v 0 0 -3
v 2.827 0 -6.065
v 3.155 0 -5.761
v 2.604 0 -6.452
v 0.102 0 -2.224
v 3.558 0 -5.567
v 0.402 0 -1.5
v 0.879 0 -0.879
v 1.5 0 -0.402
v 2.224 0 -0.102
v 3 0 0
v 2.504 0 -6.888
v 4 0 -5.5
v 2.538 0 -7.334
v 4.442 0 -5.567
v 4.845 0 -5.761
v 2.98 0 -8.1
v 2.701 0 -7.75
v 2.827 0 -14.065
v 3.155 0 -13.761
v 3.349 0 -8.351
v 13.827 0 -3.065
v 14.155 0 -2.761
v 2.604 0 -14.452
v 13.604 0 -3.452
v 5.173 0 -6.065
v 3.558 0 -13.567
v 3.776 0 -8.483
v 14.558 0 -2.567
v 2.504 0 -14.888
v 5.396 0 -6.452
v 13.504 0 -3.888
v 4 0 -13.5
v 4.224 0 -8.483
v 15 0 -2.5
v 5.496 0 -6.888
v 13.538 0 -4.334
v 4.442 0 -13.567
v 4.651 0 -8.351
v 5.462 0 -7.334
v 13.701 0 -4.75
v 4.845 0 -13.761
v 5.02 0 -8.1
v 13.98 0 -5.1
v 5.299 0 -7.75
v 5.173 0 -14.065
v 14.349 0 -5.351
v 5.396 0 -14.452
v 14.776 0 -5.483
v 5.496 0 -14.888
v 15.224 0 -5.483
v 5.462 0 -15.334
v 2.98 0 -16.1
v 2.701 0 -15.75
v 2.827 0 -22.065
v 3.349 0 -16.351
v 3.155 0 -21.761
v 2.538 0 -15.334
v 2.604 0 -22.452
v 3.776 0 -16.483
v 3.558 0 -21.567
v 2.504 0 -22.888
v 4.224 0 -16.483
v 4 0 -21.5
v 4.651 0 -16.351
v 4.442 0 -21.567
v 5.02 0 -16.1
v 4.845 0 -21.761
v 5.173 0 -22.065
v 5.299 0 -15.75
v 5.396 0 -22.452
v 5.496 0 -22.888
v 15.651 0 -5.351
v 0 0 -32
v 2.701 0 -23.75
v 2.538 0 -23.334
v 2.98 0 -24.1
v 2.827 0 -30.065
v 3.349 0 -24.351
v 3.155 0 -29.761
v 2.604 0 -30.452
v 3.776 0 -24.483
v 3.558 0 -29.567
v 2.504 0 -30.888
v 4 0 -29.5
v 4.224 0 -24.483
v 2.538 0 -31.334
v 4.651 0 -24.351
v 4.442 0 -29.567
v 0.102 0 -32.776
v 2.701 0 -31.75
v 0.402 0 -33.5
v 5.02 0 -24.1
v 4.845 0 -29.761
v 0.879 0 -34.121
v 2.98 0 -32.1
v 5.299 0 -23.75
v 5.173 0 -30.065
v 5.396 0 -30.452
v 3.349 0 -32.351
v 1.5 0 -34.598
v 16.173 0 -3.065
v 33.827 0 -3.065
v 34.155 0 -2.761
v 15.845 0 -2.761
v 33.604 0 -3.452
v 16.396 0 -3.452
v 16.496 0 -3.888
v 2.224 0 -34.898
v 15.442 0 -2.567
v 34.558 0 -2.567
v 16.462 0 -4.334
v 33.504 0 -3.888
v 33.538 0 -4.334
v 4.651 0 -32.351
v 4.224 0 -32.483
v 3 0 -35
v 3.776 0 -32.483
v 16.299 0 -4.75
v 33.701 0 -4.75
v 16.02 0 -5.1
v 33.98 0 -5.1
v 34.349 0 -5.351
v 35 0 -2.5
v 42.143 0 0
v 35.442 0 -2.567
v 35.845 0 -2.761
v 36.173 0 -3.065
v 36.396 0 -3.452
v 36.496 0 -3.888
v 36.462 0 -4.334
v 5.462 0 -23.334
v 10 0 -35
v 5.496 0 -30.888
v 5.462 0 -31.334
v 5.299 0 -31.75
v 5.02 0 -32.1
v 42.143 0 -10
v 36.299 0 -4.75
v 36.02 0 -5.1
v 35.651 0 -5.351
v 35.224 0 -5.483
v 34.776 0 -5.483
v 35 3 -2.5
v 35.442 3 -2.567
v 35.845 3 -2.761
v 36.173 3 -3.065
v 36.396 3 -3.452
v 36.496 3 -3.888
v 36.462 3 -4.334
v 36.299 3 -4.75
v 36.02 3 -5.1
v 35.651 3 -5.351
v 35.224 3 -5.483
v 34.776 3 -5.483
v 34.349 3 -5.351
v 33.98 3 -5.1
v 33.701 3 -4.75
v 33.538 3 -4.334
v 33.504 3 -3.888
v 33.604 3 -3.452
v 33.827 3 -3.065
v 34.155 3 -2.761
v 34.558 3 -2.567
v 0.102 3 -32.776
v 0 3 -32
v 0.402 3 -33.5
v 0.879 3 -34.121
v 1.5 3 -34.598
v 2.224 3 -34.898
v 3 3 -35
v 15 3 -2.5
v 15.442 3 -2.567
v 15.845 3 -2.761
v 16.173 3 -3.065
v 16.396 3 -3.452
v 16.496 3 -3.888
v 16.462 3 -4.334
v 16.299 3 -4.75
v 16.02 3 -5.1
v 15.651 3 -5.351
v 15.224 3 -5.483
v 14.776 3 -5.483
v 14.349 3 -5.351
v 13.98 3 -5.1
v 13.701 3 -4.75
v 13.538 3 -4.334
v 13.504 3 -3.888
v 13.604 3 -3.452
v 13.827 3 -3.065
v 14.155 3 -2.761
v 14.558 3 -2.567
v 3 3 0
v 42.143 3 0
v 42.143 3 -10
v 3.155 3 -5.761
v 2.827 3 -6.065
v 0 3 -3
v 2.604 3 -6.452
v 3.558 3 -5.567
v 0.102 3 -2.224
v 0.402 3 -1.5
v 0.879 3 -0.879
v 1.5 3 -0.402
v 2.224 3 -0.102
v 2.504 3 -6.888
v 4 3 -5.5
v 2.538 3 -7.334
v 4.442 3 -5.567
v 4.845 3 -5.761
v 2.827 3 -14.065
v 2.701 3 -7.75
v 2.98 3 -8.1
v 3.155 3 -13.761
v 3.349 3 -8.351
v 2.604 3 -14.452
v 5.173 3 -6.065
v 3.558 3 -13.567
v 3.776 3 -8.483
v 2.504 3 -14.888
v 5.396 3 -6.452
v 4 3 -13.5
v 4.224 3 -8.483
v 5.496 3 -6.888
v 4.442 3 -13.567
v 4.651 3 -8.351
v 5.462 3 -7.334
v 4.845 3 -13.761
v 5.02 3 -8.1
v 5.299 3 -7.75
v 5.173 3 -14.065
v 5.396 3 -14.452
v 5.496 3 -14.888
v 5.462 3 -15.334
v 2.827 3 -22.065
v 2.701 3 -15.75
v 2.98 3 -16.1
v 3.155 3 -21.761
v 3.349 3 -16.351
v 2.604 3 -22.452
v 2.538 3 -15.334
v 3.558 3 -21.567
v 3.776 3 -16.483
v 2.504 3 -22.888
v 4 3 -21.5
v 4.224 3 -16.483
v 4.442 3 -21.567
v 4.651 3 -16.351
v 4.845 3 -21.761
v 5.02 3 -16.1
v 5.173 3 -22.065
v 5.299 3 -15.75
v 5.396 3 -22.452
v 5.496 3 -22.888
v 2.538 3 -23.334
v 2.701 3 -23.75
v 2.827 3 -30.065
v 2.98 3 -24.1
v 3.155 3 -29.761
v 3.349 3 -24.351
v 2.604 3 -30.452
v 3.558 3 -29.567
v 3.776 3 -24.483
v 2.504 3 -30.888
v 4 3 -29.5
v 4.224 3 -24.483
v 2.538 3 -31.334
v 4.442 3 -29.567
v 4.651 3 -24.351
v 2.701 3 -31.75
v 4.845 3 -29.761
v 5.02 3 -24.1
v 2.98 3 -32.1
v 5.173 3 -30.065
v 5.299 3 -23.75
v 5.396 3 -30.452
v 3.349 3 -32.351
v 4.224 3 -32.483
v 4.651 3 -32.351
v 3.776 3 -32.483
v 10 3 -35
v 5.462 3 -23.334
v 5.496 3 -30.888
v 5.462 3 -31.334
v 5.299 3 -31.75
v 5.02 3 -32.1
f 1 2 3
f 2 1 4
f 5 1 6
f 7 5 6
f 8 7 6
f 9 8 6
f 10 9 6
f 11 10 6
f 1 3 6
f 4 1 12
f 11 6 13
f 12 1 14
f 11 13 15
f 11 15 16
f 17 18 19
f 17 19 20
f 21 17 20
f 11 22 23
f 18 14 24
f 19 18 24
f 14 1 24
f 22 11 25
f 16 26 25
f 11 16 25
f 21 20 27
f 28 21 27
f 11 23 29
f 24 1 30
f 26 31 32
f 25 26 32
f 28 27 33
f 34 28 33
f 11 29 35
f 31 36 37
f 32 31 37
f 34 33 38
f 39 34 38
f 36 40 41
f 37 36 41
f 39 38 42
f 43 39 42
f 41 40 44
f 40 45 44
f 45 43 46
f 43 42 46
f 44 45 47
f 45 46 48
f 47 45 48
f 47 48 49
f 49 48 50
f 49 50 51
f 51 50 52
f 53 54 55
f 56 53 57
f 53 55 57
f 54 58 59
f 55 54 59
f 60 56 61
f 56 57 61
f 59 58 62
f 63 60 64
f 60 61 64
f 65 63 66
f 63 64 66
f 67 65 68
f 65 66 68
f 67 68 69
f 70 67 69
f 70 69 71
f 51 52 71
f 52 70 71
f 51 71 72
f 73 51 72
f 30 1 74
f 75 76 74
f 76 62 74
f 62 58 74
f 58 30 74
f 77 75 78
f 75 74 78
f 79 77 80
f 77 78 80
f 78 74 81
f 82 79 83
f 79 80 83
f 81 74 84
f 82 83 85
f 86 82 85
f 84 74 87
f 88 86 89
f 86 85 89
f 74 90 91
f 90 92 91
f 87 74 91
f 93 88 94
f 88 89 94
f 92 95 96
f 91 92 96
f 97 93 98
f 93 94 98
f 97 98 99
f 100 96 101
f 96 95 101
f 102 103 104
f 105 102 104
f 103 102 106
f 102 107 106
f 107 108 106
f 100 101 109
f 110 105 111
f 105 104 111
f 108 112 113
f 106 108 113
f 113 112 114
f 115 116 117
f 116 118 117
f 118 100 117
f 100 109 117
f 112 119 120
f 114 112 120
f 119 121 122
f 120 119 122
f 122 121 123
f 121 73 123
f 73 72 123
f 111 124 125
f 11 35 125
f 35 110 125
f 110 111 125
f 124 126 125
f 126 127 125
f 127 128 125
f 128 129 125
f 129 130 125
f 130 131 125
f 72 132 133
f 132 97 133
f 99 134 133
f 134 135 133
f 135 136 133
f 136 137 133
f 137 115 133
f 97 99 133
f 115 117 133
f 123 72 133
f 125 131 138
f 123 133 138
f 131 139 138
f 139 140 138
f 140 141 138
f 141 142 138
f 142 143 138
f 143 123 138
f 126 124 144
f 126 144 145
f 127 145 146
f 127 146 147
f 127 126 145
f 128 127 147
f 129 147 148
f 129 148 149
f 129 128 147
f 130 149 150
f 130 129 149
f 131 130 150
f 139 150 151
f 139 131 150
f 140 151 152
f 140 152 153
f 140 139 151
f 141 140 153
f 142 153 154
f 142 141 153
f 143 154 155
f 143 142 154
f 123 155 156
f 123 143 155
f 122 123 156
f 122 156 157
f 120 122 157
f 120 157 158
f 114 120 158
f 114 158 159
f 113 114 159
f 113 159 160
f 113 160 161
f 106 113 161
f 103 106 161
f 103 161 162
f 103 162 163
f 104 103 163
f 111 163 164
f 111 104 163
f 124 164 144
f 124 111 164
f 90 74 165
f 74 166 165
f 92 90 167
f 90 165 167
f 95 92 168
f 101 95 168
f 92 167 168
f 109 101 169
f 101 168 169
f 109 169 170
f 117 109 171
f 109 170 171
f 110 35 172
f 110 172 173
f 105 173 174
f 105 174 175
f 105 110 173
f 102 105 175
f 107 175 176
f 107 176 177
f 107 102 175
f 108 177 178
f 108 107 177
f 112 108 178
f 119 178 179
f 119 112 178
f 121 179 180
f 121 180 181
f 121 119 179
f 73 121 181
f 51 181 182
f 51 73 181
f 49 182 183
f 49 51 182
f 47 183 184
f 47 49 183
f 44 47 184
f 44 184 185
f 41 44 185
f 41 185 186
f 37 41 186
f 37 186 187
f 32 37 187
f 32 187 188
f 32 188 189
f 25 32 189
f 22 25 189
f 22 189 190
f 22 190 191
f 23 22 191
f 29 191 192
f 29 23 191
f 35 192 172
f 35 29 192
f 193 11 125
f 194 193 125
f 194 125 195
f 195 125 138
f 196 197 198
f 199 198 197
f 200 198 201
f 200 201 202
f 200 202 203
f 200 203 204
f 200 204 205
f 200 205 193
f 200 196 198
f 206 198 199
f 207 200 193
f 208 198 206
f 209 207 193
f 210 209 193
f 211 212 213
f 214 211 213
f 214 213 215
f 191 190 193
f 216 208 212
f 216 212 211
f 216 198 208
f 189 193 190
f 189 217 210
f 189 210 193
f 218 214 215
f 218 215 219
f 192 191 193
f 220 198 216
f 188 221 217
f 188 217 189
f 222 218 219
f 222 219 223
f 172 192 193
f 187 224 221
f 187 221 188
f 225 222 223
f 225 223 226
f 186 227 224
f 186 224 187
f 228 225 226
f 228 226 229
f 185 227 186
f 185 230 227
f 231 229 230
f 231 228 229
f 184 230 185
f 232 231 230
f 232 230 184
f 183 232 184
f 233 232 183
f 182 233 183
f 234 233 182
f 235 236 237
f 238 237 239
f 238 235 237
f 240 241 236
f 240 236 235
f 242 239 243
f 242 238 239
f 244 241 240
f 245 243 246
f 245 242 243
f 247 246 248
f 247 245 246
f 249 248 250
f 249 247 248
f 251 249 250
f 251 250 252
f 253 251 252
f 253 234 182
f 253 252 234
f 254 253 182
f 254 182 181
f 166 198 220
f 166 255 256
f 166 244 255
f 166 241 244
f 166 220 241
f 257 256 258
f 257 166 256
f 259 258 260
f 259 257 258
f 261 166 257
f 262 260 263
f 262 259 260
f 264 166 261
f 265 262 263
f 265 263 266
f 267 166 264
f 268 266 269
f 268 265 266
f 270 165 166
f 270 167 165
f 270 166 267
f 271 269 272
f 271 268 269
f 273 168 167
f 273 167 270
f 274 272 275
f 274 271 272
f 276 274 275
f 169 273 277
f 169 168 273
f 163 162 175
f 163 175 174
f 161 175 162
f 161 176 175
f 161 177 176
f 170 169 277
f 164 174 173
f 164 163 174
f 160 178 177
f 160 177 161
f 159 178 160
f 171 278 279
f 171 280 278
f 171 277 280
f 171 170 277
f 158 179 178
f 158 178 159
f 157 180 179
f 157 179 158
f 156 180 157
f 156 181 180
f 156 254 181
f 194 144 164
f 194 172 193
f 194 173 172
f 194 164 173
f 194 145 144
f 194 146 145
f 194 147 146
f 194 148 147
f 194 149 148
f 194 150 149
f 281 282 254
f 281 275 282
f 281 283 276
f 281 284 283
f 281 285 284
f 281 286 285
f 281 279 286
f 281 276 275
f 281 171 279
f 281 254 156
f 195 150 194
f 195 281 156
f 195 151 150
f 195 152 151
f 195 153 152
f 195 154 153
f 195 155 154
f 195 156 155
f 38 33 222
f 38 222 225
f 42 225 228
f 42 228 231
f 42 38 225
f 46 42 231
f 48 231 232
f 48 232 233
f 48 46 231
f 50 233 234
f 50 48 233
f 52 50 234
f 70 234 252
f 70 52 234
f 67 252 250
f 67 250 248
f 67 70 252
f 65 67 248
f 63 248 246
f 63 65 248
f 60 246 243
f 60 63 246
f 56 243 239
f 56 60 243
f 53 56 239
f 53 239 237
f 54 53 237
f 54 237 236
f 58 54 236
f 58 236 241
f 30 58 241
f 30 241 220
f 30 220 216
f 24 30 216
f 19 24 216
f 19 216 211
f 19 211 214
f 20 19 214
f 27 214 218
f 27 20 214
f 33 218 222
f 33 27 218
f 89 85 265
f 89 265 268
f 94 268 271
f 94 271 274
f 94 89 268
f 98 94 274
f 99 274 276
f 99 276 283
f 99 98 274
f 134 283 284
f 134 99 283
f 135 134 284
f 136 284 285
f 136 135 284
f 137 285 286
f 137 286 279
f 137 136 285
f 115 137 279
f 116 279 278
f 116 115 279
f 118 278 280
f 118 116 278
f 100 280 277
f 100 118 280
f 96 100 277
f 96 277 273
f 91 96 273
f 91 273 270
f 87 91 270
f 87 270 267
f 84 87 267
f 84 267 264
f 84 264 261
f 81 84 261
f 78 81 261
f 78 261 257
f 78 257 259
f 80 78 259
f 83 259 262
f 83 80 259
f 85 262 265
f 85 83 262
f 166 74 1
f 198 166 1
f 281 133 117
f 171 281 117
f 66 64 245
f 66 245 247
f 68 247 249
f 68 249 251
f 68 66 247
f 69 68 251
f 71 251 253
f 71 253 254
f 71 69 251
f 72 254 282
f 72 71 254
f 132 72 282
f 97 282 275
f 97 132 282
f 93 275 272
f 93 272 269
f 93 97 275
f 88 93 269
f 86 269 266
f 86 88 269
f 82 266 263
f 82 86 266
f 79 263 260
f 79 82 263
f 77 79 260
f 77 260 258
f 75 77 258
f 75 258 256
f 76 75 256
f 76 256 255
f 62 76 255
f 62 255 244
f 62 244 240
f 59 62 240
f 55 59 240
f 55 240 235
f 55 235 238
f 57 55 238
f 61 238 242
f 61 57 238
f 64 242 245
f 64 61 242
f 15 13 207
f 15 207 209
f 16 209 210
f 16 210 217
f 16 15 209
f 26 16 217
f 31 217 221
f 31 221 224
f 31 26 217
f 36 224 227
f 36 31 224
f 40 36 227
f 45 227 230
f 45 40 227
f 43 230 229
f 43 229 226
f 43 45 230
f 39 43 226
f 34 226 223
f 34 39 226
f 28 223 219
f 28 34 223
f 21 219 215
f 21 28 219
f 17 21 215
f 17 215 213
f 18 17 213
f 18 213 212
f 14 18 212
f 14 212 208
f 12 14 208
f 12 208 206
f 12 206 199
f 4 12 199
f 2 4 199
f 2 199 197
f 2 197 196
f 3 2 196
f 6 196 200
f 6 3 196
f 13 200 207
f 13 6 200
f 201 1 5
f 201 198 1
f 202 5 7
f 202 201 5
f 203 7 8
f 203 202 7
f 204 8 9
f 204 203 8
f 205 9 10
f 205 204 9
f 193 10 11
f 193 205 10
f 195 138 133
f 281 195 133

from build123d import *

# Parameters (mm, degrees)
SKETCH_1_R      = 1.5
EXTRUDE_1_DEPTH = 3
FILLET_1_R      = 3


with BuildPart() as part:
    # 草图1 → 凸台-拉伸1 (new body)
    with BuildSketch(Plane(origin=(0, 0, 0), x_dir=(1, 0, 0), z_dir=(0, 1, 0))):
        Polygon((0, 35), (0, 0), (42.142857143, 0), (42.142857143, 10), (10, 35), align=None)
        with Locations(Location((4, 7, 0), (0, 0, 270))):
            Circle(SKETCH_1_R, mode=Mode.SUBTRACT)
        with Locations(Location((15, 4, 0), (0, 0, 270))):
            Circle(SKETCH_1_R, mode=Mode.SUBTRACT)
        with Locations(Location((4, 15, 0), (0, 0, 270))):
            Circle(SKETCH_1_R, mode=Mode.SUBTRACT)
        with Locations(Location((35, 4, 0), (0, 0, 270))):
            Circle(SKETCH_1_R, mode=Mode.SUBTRACT)
        with Locations(Location((4, 23, 0), (0, 0, 270))):
            Circle(SKETCH_1_R, mode=Mode.SUBTRACT)
        with Locations(Location((4, 31, 0), (0, 0, 270))):
            Circle(SKETCH_1_R, mode=Mode.SUBTRACT)
    extrude(amount=EXTRUDE_1_DEPTH)

    # 圆角1
    fillet_1_edges = [part.edges().sort_by_distance(p)[0] for p in [
        (0, 1.5, 0),
        (0, 1.5, -35),
    ]]
    fillet(fillet_1_edges, radius=FILLET_1_R)


solid = part.part
